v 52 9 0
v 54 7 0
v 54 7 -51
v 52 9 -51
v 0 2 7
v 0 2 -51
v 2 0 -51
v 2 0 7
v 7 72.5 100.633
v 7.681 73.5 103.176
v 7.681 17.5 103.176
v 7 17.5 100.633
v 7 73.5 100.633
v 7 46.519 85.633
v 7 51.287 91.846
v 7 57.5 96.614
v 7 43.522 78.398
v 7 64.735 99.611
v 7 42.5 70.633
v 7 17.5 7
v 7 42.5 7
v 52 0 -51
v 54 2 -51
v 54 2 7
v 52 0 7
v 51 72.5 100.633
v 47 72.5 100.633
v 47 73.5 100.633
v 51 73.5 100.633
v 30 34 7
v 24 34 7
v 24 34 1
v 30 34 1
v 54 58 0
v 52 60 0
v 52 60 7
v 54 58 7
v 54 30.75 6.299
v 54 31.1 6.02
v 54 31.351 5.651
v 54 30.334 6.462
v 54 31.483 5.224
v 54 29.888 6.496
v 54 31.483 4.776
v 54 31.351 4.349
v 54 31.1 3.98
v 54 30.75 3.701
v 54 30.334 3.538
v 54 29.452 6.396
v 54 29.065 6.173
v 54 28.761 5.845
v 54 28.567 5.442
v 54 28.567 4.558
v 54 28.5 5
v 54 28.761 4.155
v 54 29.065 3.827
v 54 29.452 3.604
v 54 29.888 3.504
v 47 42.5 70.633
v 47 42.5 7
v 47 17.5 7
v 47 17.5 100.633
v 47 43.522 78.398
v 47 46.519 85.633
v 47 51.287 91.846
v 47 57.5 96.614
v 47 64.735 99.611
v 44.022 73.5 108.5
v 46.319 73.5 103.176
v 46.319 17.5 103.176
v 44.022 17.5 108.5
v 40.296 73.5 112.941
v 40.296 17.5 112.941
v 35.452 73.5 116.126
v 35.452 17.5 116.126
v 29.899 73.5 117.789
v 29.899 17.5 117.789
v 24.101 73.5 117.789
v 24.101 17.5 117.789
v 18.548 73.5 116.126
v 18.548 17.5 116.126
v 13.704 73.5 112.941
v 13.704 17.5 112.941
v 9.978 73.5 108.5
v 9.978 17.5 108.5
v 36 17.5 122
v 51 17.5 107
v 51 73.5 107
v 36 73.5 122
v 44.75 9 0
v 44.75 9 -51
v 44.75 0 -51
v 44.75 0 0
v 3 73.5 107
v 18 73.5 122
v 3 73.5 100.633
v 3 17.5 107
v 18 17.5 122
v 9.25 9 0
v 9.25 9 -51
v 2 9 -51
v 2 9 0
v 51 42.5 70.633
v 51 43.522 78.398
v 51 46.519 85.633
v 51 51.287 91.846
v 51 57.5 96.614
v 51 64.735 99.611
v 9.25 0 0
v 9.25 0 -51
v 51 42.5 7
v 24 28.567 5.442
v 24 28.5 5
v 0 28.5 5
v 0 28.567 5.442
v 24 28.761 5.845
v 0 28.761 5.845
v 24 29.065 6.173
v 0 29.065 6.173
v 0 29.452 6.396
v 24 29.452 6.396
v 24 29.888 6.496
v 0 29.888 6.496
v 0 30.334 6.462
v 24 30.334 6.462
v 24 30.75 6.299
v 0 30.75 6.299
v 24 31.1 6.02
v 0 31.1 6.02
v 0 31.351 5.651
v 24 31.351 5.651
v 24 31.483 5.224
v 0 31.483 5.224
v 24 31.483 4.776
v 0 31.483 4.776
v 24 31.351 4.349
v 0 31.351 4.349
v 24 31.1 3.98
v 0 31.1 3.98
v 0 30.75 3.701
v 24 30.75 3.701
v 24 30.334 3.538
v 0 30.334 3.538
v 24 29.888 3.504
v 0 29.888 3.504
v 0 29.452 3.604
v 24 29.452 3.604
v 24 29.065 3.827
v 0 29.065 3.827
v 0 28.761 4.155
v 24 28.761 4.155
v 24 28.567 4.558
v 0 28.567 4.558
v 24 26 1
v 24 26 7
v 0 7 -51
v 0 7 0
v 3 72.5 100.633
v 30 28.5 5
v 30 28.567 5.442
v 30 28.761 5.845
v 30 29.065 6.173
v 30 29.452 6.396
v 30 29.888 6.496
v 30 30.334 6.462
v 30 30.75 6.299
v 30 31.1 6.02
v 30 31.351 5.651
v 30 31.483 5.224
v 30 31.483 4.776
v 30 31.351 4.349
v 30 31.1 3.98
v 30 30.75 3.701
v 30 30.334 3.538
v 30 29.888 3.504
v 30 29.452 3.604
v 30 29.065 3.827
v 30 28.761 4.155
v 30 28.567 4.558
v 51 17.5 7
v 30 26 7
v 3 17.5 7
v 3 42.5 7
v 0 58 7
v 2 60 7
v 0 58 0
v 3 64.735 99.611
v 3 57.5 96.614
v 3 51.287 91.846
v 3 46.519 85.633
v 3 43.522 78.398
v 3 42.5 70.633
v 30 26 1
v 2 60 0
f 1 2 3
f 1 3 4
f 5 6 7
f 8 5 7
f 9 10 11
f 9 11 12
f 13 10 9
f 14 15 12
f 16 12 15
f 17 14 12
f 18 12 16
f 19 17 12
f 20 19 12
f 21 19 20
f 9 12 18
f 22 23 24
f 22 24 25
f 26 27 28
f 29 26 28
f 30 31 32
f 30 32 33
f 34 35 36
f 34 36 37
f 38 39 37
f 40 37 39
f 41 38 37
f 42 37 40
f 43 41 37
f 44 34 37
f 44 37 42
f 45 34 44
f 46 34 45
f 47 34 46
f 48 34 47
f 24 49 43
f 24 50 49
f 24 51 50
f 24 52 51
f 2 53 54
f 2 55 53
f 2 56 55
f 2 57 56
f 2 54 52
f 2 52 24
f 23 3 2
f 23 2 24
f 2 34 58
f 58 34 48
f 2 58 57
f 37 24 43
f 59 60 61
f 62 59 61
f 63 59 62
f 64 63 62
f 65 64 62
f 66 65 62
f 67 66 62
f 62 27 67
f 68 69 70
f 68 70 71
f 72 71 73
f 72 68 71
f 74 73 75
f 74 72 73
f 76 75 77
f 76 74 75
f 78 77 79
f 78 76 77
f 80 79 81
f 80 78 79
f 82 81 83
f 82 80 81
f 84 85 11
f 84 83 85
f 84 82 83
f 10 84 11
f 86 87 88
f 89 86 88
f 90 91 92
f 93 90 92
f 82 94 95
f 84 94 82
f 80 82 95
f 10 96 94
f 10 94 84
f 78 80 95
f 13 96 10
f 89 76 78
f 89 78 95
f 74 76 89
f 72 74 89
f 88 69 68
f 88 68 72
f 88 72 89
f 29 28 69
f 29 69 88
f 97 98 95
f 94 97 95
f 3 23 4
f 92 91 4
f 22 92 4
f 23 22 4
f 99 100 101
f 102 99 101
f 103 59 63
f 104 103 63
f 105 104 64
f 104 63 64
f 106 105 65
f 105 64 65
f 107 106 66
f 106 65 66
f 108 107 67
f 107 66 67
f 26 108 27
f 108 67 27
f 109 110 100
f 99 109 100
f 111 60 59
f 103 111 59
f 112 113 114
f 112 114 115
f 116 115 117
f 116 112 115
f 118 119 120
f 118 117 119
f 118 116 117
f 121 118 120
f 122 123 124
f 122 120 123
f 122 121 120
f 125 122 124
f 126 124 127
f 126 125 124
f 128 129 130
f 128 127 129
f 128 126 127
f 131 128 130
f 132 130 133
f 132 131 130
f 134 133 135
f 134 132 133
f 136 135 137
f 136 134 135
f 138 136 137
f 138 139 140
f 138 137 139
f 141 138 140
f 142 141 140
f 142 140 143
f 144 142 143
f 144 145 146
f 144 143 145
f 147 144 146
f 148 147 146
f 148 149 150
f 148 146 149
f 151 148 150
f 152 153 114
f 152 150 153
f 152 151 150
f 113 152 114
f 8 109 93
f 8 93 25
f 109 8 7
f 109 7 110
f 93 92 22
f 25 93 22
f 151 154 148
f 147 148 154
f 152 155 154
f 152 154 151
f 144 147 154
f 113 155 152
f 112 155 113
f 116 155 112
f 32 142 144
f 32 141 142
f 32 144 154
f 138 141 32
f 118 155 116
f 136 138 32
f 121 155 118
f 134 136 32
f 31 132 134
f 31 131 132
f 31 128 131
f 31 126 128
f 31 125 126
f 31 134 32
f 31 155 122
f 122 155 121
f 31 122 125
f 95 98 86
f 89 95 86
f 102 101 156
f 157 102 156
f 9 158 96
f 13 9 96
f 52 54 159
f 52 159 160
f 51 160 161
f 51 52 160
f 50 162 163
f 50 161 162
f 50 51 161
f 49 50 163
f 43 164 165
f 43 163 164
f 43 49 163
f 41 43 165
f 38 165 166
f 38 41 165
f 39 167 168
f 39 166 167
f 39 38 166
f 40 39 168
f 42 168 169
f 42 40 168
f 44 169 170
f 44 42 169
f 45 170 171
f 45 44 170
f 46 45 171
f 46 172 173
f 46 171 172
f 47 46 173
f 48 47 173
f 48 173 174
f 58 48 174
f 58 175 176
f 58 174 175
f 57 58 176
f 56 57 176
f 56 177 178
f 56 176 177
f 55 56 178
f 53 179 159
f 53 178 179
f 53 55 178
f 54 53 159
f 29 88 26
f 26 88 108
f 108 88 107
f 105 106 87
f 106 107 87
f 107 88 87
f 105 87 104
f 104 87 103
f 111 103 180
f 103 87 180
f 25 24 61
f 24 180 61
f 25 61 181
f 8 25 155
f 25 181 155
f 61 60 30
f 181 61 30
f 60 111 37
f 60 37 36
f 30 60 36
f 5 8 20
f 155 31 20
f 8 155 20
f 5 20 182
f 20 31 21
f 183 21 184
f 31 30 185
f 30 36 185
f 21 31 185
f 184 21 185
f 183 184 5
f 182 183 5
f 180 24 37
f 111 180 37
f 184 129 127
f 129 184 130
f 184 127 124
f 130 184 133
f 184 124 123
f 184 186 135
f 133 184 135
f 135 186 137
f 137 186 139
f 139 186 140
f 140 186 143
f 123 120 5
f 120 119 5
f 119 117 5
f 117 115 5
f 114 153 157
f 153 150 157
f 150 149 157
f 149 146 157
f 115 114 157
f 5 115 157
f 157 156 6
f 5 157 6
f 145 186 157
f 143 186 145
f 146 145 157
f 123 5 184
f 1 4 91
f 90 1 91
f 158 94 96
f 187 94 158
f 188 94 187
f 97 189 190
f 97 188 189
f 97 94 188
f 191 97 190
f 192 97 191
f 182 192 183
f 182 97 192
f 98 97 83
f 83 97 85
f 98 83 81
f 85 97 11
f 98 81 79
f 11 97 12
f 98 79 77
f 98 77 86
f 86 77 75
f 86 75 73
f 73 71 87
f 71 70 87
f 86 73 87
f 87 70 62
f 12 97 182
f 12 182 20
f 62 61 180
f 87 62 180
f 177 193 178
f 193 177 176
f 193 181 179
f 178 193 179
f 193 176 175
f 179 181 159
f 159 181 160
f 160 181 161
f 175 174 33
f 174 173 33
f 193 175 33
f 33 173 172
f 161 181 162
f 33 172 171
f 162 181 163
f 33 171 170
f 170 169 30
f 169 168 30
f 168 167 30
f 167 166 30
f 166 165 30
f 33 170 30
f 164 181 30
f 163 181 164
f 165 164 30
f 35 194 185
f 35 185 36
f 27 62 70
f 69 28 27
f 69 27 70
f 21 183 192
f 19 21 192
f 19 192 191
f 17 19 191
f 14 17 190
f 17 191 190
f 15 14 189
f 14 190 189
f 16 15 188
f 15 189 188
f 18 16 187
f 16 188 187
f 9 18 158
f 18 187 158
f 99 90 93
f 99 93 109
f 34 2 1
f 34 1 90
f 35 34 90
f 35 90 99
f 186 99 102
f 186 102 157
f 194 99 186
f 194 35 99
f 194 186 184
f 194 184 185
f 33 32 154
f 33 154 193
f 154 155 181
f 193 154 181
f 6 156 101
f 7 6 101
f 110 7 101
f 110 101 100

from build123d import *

# Parameters (mm, degrees)
BOSS_EXTRUDE1_DEPTH      = 5
BOSS_EXTRUDE2_DEPTH      = 56
BOSS_EXTRUDE2_2_DEPTH    = 56
BOSS_EXTRUDE3_DEPTH      = 2
BOSS_EXTRUDE3_DEPTH_BACK = 5
SKETCH9_W                = 6
SKETCH9_H                = 8
CUT_EXTRUDE3_DEPTH       = 6
CUT_EXTRUDE4_DEPTH       = 85.267431431
CUT_EXTRUDE4_DEPTH_BACK  = 85.267431431
SKETCH10_R               = 1.5
BOSS_EXTRUDE4_DEPTH      = 43.5
BOSS_EXTRUDE4_DEPTH_BACK = 12.5
SKETCH11_W               = 48
SKETCH11_H               = 115
CUT_EXTRUDE5_DEPTH       = 153.322847925
CUT_EXTRUDE6_DEPTH       = 145.966375412
CUT_EXTRUDE6_DEPTH_BACK  = 145.966375412
CHAMFER1_SIZE            = 15
CHAMFER2_SIZE            = 15


with BuildPart() as part:
    # Sketch1 → Boss-Extrude1 (new body)
    with BuildSketch(Plane.XY):
        Polygon((37.6, 51), (52, 51), (54, 53), (54, 58), (52, 60), (2, 60), (0, 58), (0, 53), (2, 51), (16.4, 51), align=None)
    extrude(amount=BOSS_EXTRUDE1_DEPTH)



with BuildPart() as body_2:
    # Sketch2 → Boss-Extrude2 (new body)
    with BuildSketch(Plane.XY.offset(-51)):
        Polygon((0, 7), (0, 2), (2, 0), (9.25, 0), (9.25, 9), (2, 9), align=None)
    extrude(amount=BOSS_EXTRUDE2_DEPTH)


with BuildPart() as body_3:
    # Sketch2 → Boss-Extrude2 2 (new body)
    with BuildSketch(Plane.XY.offset(-51)):
        Polygon((54, 2), (54, 7), (52, 9), (44.75, 9), (44.75, 0), (52, 0), align=None)
    extrude(amount=BOSS_EXTRUDE2_2_DEPTH)


with BuildPart() as part_1:
    add(part.part)

    add(body_2.part)  # Boss-Extrude3 merges body 2

    add(body_3.part)  # Boss-Extrude3 merges body 3
    # Sketch8 → Boss-Extrude3 (add, two sides: drawn at the far end of the back side and taken through both)
    with BuildSketch(Plane.XY.offset(5).offset(-BOSS_EXTRUDE3_DEPTH_BACK)):
        Polygon((0, 2), (0, 58), (2, 60), (52, 60), (54, 58), (54, 2), (52, 0), (2, 0), align=None)
    extrude(amount=BOSS_EXTRUDE3_DEPTH + BOSS_EXTRUDE3_DEPTH_BACK)

    # Sketch9 → Cut-Extrude3 (cut)
    with BuildSketch(Plane.XY.offset(7)):
        with Locations((27, 30)):
            Rectangle(SKETCH9_W, SKETCH9_H)
    extrude(amount=-CUT_EXTRUDE3_DEPTH, mode=Mode.SUBTRACT)

    # Sketch10 → Cut-Extrude4 (cut, two sides: drawn at the far end of the back side and taken through both)
    with BuildSketch(Plane.ZY.offset(-30).offset(-CUT_EXTRUDE4_DEPTH_BACK)):
        with Locations(Location((5, 30, 0), (0, 0, 270))):
            Circle(SKETCH10_R)
    extrude(amount=CUT_EXTRUDE4_DEPTH + CUT_EXTRUDE4_DEPTH_BACK, mode=Mode.SUBTRACT)

    # Sketch11 → Boss-Extrude4 (add, two sides: drawn at the far end of the back side and taken through both)
    with BuildSketch(Plane(origin=(0, 30, 0), x_dir=(1, 0, 0), z_dir=(0, 1, 0)).offset(-BOSS_EXTRUDE4_DEPTH_BACK)):
        with Locations((27, -64.5)):
            Rectangle(SKETCH11_W, SKETCH11_H)
    extrude(amount=BOSS_EXTRUDE4_DEPTH + BOSS_EXTRUDE4_DEPTH_BACK)

    # Sketch12 → Cut-Extrude5 (cut, through all)
    with BuildSketch(Plane(origin=(0, 73.5, 0), x_dir=(1, 0, 0), z_dir=(0, 1, 0))):
        with BuildLine():
            Line((7, -100.633049952), (7, -7))
            Line((7, -7), (47, -7))
            Line((47, -7), (47, -100.633049952))
            Line((47, -100.633049952), (46.318516526, -103.176380902))
            ThreePointArc((46.318516526, -103.176380902), (27, -118), (7.681483474, -103.176380902))
            Line((7.681483474, -103.176380902), (7, -100.633049952))
        make_face()
    extrude(amount=-CUT_EXTRUDE5_DEPTH, mode=Mode.SUBTRACT)

    # Sketch13 → Cut-Extrude6 (cut, two sides: drawn at the far end of the back side and taken through both)
    with BuildSketch(Plane(origin=(27, 0, 0), x_dir=(0, 0, -1), z_dir=(1, 0, 0)).offset(-CUT_EXTRUDE6_DEPTH_BACK)):
        with BuildLine():
            Line((-7, 42.5), (-70.633049952, 42.5))
            ThreePointArc((-70.633049952, 42.5), (-91.846253387, 51.286796564), (-100.633049952, 72.5))
            Line((-100.633049952, 72.5), (-100.633049952, 73.5))
            Line((-100.633049952, 73.5), (-7, 73.5))
            Line((-7, 73.5), (-7, 42.5))
        make_face()
    extrude(amount=CUT_EXTRUDE6_DEPTH + CUT_EXTRUDE6_DEPTH_BACK, mode=Mode.SUBTRACT)

    # Chamfer1
    chamfer1_edges = [part_1.edges().sort_by_distance(p)[0] for p in [
        (3, 45.5, 122),
    ]]
    chamfer(chamfer1_edges, length=CHAMFER1_SIZE)

    # Chamfer2
    chamfer2_edges = [part_1.edges().sort_by_distance(p)[0] for p in [
        (51, 45.5, 122),
    ]]
    chamfer(chamfer2_edges, length=CHAMFER2_SIZE)


solid = part_1.part
